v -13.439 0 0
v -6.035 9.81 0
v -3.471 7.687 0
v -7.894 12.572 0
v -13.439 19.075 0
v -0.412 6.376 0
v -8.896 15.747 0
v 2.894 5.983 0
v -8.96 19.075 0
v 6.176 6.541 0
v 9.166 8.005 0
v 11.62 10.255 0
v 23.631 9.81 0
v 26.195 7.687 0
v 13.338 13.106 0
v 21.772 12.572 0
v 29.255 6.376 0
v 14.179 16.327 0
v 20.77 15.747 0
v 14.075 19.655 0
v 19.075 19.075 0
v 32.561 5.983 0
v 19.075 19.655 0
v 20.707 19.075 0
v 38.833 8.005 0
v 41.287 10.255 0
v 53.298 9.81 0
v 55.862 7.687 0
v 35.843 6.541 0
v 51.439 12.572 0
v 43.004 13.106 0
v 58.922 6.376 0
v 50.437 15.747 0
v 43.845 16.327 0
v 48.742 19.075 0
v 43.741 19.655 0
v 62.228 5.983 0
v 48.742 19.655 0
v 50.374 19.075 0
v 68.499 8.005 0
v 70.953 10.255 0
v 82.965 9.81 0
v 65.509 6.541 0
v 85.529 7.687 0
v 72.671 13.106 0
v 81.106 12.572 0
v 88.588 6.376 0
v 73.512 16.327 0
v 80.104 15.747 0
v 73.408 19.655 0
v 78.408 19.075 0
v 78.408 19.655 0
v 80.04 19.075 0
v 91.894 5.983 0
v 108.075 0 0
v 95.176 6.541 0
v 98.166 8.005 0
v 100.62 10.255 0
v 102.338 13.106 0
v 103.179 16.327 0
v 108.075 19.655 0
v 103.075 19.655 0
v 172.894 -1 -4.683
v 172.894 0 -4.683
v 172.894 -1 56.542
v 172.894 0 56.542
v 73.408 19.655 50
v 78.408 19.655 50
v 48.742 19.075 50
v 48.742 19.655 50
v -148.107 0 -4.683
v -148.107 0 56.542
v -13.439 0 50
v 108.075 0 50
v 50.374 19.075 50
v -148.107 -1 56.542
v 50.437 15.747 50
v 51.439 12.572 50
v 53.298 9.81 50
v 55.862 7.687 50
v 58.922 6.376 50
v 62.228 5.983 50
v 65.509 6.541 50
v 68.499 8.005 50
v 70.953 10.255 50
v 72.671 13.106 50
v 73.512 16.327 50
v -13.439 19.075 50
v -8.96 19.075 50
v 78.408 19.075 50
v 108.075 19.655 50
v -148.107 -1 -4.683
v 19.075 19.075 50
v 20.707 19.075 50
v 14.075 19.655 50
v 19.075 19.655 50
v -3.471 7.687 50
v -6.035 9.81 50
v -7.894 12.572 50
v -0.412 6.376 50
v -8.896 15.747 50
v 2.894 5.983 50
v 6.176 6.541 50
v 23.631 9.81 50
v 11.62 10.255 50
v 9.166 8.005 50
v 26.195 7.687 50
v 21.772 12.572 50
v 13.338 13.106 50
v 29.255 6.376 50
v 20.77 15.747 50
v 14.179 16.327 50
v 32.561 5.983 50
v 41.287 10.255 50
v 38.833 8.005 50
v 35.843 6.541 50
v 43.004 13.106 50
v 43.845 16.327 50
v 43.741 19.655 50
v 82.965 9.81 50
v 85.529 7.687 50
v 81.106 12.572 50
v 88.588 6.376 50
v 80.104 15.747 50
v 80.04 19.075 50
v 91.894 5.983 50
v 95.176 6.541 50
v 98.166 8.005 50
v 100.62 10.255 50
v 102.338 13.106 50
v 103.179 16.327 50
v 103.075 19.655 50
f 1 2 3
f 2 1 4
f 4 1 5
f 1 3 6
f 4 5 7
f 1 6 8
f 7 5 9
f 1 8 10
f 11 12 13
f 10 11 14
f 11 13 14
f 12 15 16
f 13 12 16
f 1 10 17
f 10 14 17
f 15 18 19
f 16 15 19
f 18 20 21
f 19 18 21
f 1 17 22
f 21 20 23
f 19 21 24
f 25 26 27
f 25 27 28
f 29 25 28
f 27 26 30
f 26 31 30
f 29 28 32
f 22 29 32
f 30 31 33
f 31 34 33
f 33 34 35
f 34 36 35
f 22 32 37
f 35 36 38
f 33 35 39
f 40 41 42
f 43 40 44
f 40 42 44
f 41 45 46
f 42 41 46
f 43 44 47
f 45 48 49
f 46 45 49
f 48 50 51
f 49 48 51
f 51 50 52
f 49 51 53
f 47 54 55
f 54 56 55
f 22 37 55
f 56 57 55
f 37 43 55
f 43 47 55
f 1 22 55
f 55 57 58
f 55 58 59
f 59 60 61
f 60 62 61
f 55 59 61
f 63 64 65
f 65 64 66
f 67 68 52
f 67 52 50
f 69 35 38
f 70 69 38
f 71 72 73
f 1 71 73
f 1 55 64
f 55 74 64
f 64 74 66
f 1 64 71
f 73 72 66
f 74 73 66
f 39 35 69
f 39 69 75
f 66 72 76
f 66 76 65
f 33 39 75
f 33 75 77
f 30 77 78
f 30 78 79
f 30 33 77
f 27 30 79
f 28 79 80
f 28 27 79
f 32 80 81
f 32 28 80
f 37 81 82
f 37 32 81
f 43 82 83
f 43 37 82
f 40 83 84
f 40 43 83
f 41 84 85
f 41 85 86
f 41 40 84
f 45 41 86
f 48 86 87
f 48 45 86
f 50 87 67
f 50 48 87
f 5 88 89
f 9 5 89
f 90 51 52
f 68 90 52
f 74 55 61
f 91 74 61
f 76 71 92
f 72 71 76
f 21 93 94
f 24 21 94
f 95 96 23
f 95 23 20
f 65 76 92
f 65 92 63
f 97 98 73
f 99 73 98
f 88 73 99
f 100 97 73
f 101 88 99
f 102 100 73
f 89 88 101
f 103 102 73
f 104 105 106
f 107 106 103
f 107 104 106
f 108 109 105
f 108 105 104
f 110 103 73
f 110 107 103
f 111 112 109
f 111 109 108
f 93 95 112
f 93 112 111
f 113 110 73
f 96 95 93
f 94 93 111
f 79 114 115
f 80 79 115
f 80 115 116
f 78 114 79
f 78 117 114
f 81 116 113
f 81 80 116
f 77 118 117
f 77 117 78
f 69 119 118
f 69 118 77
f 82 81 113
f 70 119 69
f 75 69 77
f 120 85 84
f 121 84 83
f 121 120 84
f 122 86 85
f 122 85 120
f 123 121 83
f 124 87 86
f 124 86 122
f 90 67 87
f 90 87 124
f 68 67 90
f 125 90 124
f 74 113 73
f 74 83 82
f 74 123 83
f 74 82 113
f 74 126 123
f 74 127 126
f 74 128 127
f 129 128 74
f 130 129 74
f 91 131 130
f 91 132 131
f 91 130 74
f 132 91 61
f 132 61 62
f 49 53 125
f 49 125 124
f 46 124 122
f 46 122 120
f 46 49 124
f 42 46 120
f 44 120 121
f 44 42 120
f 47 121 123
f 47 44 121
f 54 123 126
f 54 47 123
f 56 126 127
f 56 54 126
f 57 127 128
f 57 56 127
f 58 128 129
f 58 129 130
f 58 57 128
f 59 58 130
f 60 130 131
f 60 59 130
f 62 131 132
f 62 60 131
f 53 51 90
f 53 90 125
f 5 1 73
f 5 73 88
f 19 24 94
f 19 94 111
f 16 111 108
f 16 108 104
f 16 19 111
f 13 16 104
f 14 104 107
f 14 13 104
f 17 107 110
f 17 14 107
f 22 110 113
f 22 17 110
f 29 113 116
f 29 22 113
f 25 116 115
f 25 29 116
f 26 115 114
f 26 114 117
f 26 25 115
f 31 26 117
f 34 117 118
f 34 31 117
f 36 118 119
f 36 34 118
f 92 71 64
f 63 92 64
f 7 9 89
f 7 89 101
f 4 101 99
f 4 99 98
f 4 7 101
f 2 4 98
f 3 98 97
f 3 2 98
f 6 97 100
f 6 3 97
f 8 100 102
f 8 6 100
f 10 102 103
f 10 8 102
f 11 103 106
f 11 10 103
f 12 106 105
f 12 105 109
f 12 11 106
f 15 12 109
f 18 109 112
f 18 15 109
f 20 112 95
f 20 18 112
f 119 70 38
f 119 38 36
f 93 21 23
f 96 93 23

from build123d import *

# Parameters (mm, degrees)
SKETCH001_W         = 321.000992
SKETCH001_H         = 61.225169
PAD001_DEPTH        = 1
PAD_DEPTH           = 50
LINEARPATTERN_COUNT = 4
LINEARPATTERN_PITCH = 29.666667


with BuildPart() as part:
    # Sketch001 → Pad001 (new body)
    with BuildSketch(Plane.XZ):
        with Locations((12.393837, 25.929693)):
            Rectangle(SKETCH001_W, SKETCH001_H)
    extrude(amount=PAD001_DEPTH)

    # Sketch → Pad (join)
    with BuildSketch(Plane.XY):
        with BuildLine():
            Line((-13.439306, 0), (19.075138, 0))
            Line((19.075138, 0), (19.075138, 19.654779))
            Line((19.075138, 19.654779), (14.074553, 19.654779))
            ThreePointArc((-8.959539, 19.075142), (2.894254, 5.983074), (14.074553, 19.654779))
            Line((-13.439306, 19.075142), (-8.959539, 19.075142))
            Line((-13.439306, 0), (-13.439306, 19.075142))
        make_face()
    pad = extrude(amount=PAD_DEPTH)

    # LinearPattern: Pad ×4
    with Locations(*[(i * LINEARPATTERN_PITCH, 0, 0) for i in range(1, LINEARPATTERN_COUNT)]):
        add(pad)


solid = part.part
